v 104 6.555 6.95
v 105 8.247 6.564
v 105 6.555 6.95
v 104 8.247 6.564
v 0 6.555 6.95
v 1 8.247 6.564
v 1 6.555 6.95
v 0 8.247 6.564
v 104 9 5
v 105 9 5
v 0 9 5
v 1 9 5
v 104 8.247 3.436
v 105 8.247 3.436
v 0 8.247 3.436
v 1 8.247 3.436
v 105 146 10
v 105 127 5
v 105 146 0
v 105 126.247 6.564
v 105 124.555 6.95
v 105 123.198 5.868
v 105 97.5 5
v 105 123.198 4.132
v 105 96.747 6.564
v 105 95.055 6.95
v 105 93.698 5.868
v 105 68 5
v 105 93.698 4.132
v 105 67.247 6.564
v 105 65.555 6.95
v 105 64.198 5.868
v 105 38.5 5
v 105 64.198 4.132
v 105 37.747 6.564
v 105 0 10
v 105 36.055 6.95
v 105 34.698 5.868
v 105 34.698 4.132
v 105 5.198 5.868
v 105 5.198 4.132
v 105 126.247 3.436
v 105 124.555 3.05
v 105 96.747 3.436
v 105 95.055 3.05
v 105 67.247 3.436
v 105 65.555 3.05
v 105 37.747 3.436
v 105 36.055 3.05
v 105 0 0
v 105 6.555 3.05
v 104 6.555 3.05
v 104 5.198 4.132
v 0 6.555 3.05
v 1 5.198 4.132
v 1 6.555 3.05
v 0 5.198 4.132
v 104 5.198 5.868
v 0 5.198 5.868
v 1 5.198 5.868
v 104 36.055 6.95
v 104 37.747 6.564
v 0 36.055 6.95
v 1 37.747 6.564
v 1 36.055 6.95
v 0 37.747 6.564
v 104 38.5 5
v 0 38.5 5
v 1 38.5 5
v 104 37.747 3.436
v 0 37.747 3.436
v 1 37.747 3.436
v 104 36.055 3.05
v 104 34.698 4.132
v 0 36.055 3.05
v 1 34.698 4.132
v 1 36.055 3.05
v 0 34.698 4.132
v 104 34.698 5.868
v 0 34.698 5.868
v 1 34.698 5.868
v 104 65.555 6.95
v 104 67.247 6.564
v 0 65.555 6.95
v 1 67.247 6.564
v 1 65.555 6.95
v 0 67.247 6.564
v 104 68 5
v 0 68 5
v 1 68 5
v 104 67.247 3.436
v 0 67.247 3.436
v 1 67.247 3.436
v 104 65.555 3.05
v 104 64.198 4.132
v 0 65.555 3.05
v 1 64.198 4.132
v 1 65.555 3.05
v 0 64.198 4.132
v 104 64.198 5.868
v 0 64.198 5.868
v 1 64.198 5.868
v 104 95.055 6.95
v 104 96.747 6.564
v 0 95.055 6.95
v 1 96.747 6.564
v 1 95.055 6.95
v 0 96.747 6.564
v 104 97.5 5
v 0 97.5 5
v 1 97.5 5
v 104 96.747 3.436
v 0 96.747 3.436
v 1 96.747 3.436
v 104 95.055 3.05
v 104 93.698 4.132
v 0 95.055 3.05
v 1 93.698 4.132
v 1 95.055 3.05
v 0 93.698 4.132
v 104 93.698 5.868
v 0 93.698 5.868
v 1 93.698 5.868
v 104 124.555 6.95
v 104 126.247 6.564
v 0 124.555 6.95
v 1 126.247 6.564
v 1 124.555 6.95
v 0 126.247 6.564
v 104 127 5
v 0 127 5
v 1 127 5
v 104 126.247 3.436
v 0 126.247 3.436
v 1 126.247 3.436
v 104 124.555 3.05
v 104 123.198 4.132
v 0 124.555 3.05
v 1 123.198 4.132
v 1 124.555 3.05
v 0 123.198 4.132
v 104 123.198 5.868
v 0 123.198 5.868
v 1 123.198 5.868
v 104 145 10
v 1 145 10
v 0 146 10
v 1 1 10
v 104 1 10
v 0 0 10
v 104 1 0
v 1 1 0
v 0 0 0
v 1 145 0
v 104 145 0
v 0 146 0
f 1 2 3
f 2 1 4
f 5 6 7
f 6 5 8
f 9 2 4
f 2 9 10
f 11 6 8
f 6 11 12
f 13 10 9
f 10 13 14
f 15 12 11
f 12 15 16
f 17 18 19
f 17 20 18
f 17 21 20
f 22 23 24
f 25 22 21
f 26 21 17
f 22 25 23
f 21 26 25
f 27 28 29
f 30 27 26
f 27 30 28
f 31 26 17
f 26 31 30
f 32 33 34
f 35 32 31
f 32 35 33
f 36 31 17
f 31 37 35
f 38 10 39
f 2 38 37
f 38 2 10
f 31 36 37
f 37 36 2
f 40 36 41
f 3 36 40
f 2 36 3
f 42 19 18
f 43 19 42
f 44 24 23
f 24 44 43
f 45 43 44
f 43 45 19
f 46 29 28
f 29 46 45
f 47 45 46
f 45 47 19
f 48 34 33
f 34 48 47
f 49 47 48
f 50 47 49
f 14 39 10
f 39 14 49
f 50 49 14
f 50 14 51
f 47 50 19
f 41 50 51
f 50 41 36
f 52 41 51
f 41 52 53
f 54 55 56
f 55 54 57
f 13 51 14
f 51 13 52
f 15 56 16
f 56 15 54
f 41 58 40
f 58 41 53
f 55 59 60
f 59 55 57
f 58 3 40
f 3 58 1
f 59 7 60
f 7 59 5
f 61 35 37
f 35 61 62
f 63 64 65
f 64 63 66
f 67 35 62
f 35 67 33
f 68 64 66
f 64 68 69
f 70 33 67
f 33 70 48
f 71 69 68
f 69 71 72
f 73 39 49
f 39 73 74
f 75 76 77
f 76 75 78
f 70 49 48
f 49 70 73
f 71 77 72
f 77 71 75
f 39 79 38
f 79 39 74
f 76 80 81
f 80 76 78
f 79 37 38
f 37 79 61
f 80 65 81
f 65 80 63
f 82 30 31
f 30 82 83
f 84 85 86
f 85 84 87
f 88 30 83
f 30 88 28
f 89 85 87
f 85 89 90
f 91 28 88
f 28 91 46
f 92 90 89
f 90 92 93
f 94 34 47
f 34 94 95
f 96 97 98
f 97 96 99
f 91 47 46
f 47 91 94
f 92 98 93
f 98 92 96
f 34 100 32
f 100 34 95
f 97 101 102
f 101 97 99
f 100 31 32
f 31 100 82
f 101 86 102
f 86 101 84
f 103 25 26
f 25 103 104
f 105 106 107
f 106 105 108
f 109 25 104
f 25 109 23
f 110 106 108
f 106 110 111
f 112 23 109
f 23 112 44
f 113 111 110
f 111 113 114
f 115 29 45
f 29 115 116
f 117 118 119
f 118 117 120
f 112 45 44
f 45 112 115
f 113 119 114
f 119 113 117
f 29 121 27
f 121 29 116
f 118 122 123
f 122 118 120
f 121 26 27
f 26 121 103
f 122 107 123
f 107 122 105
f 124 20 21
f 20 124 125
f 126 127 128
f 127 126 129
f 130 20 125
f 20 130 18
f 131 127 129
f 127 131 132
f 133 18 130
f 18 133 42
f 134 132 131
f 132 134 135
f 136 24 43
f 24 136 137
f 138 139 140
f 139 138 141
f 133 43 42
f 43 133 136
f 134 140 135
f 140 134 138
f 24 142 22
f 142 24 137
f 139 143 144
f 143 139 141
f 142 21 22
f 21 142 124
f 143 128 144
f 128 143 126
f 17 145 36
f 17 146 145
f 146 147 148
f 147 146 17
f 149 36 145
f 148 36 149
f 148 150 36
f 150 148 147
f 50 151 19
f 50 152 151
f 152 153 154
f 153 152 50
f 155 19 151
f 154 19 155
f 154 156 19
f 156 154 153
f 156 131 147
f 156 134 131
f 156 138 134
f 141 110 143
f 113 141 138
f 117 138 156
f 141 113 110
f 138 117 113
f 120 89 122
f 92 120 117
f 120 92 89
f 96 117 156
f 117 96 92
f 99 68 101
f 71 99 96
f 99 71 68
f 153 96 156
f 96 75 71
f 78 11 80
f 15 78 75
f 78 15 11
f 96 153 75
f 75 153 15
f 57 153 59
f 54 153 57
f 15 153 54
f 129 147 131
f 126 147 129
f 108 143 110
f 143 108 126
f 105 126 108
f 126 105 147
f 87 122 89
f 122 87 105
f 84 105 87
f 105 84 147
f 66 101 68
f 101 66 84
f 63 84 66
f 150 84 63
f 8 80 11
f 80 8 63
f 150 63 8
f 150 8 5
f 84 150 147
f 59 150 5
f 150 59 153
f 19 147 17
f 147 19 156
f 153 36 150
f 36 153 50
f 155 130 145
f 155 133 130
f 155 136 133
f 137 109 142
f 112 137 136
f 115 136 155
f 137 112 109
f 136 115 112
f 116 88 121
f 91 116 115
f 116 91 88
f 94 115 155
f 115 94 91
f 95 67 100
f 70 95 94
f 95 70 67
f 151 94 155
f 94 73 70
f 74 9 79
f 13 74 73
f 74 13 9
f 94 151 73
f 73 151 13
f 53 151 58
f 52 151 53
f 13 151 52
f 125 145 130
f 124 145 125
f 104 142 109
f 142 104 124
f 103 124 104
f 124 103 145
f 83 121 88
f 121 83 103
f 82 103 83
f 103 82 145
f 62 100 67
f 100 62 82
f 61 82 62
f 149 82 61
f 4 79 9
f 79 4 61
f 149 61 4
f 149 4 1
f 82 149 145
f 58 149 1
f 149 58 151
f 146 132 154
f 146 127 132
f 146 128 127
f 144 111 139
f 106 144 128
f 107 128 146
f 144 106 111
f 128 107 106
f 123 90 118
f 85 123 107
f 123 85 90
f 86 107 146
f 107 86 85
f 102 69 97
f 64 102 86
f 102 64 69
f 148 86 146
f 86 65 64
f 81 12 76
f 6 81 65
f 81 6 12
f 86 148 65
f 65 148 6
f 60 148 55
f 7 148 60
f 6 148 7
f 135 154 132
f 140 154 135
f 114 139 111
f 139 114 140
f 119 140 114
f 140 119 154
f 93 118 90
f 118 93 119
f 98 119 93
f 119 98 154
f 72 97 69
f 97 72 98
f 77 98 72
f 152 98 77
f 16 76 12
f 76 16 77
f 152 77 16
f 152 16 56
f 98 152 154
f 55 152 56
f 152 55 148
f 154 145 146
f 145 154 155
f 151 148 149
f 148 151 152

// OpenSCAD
thickness=1;

iw=103;
il=144;
h=10; // Just for testing

screw_r=2;
screw_offset=thickness+6;
screw_delta=29.5;


difference() {
// outside cube
cube([iw+(thickness*2),il+(thickness*2),h]);

// inside cube
translate([thickness,thickness,-1])
       cube([iw,il,h+2]);

// screw holes
for(x=[screw_offset:screw_delta:screw_delta*6]){
    rotate([90,0,90])
        translate([x,h/2,-2])
            cylinder(r=screw_r,h=iw+4,center=false);
}
}
